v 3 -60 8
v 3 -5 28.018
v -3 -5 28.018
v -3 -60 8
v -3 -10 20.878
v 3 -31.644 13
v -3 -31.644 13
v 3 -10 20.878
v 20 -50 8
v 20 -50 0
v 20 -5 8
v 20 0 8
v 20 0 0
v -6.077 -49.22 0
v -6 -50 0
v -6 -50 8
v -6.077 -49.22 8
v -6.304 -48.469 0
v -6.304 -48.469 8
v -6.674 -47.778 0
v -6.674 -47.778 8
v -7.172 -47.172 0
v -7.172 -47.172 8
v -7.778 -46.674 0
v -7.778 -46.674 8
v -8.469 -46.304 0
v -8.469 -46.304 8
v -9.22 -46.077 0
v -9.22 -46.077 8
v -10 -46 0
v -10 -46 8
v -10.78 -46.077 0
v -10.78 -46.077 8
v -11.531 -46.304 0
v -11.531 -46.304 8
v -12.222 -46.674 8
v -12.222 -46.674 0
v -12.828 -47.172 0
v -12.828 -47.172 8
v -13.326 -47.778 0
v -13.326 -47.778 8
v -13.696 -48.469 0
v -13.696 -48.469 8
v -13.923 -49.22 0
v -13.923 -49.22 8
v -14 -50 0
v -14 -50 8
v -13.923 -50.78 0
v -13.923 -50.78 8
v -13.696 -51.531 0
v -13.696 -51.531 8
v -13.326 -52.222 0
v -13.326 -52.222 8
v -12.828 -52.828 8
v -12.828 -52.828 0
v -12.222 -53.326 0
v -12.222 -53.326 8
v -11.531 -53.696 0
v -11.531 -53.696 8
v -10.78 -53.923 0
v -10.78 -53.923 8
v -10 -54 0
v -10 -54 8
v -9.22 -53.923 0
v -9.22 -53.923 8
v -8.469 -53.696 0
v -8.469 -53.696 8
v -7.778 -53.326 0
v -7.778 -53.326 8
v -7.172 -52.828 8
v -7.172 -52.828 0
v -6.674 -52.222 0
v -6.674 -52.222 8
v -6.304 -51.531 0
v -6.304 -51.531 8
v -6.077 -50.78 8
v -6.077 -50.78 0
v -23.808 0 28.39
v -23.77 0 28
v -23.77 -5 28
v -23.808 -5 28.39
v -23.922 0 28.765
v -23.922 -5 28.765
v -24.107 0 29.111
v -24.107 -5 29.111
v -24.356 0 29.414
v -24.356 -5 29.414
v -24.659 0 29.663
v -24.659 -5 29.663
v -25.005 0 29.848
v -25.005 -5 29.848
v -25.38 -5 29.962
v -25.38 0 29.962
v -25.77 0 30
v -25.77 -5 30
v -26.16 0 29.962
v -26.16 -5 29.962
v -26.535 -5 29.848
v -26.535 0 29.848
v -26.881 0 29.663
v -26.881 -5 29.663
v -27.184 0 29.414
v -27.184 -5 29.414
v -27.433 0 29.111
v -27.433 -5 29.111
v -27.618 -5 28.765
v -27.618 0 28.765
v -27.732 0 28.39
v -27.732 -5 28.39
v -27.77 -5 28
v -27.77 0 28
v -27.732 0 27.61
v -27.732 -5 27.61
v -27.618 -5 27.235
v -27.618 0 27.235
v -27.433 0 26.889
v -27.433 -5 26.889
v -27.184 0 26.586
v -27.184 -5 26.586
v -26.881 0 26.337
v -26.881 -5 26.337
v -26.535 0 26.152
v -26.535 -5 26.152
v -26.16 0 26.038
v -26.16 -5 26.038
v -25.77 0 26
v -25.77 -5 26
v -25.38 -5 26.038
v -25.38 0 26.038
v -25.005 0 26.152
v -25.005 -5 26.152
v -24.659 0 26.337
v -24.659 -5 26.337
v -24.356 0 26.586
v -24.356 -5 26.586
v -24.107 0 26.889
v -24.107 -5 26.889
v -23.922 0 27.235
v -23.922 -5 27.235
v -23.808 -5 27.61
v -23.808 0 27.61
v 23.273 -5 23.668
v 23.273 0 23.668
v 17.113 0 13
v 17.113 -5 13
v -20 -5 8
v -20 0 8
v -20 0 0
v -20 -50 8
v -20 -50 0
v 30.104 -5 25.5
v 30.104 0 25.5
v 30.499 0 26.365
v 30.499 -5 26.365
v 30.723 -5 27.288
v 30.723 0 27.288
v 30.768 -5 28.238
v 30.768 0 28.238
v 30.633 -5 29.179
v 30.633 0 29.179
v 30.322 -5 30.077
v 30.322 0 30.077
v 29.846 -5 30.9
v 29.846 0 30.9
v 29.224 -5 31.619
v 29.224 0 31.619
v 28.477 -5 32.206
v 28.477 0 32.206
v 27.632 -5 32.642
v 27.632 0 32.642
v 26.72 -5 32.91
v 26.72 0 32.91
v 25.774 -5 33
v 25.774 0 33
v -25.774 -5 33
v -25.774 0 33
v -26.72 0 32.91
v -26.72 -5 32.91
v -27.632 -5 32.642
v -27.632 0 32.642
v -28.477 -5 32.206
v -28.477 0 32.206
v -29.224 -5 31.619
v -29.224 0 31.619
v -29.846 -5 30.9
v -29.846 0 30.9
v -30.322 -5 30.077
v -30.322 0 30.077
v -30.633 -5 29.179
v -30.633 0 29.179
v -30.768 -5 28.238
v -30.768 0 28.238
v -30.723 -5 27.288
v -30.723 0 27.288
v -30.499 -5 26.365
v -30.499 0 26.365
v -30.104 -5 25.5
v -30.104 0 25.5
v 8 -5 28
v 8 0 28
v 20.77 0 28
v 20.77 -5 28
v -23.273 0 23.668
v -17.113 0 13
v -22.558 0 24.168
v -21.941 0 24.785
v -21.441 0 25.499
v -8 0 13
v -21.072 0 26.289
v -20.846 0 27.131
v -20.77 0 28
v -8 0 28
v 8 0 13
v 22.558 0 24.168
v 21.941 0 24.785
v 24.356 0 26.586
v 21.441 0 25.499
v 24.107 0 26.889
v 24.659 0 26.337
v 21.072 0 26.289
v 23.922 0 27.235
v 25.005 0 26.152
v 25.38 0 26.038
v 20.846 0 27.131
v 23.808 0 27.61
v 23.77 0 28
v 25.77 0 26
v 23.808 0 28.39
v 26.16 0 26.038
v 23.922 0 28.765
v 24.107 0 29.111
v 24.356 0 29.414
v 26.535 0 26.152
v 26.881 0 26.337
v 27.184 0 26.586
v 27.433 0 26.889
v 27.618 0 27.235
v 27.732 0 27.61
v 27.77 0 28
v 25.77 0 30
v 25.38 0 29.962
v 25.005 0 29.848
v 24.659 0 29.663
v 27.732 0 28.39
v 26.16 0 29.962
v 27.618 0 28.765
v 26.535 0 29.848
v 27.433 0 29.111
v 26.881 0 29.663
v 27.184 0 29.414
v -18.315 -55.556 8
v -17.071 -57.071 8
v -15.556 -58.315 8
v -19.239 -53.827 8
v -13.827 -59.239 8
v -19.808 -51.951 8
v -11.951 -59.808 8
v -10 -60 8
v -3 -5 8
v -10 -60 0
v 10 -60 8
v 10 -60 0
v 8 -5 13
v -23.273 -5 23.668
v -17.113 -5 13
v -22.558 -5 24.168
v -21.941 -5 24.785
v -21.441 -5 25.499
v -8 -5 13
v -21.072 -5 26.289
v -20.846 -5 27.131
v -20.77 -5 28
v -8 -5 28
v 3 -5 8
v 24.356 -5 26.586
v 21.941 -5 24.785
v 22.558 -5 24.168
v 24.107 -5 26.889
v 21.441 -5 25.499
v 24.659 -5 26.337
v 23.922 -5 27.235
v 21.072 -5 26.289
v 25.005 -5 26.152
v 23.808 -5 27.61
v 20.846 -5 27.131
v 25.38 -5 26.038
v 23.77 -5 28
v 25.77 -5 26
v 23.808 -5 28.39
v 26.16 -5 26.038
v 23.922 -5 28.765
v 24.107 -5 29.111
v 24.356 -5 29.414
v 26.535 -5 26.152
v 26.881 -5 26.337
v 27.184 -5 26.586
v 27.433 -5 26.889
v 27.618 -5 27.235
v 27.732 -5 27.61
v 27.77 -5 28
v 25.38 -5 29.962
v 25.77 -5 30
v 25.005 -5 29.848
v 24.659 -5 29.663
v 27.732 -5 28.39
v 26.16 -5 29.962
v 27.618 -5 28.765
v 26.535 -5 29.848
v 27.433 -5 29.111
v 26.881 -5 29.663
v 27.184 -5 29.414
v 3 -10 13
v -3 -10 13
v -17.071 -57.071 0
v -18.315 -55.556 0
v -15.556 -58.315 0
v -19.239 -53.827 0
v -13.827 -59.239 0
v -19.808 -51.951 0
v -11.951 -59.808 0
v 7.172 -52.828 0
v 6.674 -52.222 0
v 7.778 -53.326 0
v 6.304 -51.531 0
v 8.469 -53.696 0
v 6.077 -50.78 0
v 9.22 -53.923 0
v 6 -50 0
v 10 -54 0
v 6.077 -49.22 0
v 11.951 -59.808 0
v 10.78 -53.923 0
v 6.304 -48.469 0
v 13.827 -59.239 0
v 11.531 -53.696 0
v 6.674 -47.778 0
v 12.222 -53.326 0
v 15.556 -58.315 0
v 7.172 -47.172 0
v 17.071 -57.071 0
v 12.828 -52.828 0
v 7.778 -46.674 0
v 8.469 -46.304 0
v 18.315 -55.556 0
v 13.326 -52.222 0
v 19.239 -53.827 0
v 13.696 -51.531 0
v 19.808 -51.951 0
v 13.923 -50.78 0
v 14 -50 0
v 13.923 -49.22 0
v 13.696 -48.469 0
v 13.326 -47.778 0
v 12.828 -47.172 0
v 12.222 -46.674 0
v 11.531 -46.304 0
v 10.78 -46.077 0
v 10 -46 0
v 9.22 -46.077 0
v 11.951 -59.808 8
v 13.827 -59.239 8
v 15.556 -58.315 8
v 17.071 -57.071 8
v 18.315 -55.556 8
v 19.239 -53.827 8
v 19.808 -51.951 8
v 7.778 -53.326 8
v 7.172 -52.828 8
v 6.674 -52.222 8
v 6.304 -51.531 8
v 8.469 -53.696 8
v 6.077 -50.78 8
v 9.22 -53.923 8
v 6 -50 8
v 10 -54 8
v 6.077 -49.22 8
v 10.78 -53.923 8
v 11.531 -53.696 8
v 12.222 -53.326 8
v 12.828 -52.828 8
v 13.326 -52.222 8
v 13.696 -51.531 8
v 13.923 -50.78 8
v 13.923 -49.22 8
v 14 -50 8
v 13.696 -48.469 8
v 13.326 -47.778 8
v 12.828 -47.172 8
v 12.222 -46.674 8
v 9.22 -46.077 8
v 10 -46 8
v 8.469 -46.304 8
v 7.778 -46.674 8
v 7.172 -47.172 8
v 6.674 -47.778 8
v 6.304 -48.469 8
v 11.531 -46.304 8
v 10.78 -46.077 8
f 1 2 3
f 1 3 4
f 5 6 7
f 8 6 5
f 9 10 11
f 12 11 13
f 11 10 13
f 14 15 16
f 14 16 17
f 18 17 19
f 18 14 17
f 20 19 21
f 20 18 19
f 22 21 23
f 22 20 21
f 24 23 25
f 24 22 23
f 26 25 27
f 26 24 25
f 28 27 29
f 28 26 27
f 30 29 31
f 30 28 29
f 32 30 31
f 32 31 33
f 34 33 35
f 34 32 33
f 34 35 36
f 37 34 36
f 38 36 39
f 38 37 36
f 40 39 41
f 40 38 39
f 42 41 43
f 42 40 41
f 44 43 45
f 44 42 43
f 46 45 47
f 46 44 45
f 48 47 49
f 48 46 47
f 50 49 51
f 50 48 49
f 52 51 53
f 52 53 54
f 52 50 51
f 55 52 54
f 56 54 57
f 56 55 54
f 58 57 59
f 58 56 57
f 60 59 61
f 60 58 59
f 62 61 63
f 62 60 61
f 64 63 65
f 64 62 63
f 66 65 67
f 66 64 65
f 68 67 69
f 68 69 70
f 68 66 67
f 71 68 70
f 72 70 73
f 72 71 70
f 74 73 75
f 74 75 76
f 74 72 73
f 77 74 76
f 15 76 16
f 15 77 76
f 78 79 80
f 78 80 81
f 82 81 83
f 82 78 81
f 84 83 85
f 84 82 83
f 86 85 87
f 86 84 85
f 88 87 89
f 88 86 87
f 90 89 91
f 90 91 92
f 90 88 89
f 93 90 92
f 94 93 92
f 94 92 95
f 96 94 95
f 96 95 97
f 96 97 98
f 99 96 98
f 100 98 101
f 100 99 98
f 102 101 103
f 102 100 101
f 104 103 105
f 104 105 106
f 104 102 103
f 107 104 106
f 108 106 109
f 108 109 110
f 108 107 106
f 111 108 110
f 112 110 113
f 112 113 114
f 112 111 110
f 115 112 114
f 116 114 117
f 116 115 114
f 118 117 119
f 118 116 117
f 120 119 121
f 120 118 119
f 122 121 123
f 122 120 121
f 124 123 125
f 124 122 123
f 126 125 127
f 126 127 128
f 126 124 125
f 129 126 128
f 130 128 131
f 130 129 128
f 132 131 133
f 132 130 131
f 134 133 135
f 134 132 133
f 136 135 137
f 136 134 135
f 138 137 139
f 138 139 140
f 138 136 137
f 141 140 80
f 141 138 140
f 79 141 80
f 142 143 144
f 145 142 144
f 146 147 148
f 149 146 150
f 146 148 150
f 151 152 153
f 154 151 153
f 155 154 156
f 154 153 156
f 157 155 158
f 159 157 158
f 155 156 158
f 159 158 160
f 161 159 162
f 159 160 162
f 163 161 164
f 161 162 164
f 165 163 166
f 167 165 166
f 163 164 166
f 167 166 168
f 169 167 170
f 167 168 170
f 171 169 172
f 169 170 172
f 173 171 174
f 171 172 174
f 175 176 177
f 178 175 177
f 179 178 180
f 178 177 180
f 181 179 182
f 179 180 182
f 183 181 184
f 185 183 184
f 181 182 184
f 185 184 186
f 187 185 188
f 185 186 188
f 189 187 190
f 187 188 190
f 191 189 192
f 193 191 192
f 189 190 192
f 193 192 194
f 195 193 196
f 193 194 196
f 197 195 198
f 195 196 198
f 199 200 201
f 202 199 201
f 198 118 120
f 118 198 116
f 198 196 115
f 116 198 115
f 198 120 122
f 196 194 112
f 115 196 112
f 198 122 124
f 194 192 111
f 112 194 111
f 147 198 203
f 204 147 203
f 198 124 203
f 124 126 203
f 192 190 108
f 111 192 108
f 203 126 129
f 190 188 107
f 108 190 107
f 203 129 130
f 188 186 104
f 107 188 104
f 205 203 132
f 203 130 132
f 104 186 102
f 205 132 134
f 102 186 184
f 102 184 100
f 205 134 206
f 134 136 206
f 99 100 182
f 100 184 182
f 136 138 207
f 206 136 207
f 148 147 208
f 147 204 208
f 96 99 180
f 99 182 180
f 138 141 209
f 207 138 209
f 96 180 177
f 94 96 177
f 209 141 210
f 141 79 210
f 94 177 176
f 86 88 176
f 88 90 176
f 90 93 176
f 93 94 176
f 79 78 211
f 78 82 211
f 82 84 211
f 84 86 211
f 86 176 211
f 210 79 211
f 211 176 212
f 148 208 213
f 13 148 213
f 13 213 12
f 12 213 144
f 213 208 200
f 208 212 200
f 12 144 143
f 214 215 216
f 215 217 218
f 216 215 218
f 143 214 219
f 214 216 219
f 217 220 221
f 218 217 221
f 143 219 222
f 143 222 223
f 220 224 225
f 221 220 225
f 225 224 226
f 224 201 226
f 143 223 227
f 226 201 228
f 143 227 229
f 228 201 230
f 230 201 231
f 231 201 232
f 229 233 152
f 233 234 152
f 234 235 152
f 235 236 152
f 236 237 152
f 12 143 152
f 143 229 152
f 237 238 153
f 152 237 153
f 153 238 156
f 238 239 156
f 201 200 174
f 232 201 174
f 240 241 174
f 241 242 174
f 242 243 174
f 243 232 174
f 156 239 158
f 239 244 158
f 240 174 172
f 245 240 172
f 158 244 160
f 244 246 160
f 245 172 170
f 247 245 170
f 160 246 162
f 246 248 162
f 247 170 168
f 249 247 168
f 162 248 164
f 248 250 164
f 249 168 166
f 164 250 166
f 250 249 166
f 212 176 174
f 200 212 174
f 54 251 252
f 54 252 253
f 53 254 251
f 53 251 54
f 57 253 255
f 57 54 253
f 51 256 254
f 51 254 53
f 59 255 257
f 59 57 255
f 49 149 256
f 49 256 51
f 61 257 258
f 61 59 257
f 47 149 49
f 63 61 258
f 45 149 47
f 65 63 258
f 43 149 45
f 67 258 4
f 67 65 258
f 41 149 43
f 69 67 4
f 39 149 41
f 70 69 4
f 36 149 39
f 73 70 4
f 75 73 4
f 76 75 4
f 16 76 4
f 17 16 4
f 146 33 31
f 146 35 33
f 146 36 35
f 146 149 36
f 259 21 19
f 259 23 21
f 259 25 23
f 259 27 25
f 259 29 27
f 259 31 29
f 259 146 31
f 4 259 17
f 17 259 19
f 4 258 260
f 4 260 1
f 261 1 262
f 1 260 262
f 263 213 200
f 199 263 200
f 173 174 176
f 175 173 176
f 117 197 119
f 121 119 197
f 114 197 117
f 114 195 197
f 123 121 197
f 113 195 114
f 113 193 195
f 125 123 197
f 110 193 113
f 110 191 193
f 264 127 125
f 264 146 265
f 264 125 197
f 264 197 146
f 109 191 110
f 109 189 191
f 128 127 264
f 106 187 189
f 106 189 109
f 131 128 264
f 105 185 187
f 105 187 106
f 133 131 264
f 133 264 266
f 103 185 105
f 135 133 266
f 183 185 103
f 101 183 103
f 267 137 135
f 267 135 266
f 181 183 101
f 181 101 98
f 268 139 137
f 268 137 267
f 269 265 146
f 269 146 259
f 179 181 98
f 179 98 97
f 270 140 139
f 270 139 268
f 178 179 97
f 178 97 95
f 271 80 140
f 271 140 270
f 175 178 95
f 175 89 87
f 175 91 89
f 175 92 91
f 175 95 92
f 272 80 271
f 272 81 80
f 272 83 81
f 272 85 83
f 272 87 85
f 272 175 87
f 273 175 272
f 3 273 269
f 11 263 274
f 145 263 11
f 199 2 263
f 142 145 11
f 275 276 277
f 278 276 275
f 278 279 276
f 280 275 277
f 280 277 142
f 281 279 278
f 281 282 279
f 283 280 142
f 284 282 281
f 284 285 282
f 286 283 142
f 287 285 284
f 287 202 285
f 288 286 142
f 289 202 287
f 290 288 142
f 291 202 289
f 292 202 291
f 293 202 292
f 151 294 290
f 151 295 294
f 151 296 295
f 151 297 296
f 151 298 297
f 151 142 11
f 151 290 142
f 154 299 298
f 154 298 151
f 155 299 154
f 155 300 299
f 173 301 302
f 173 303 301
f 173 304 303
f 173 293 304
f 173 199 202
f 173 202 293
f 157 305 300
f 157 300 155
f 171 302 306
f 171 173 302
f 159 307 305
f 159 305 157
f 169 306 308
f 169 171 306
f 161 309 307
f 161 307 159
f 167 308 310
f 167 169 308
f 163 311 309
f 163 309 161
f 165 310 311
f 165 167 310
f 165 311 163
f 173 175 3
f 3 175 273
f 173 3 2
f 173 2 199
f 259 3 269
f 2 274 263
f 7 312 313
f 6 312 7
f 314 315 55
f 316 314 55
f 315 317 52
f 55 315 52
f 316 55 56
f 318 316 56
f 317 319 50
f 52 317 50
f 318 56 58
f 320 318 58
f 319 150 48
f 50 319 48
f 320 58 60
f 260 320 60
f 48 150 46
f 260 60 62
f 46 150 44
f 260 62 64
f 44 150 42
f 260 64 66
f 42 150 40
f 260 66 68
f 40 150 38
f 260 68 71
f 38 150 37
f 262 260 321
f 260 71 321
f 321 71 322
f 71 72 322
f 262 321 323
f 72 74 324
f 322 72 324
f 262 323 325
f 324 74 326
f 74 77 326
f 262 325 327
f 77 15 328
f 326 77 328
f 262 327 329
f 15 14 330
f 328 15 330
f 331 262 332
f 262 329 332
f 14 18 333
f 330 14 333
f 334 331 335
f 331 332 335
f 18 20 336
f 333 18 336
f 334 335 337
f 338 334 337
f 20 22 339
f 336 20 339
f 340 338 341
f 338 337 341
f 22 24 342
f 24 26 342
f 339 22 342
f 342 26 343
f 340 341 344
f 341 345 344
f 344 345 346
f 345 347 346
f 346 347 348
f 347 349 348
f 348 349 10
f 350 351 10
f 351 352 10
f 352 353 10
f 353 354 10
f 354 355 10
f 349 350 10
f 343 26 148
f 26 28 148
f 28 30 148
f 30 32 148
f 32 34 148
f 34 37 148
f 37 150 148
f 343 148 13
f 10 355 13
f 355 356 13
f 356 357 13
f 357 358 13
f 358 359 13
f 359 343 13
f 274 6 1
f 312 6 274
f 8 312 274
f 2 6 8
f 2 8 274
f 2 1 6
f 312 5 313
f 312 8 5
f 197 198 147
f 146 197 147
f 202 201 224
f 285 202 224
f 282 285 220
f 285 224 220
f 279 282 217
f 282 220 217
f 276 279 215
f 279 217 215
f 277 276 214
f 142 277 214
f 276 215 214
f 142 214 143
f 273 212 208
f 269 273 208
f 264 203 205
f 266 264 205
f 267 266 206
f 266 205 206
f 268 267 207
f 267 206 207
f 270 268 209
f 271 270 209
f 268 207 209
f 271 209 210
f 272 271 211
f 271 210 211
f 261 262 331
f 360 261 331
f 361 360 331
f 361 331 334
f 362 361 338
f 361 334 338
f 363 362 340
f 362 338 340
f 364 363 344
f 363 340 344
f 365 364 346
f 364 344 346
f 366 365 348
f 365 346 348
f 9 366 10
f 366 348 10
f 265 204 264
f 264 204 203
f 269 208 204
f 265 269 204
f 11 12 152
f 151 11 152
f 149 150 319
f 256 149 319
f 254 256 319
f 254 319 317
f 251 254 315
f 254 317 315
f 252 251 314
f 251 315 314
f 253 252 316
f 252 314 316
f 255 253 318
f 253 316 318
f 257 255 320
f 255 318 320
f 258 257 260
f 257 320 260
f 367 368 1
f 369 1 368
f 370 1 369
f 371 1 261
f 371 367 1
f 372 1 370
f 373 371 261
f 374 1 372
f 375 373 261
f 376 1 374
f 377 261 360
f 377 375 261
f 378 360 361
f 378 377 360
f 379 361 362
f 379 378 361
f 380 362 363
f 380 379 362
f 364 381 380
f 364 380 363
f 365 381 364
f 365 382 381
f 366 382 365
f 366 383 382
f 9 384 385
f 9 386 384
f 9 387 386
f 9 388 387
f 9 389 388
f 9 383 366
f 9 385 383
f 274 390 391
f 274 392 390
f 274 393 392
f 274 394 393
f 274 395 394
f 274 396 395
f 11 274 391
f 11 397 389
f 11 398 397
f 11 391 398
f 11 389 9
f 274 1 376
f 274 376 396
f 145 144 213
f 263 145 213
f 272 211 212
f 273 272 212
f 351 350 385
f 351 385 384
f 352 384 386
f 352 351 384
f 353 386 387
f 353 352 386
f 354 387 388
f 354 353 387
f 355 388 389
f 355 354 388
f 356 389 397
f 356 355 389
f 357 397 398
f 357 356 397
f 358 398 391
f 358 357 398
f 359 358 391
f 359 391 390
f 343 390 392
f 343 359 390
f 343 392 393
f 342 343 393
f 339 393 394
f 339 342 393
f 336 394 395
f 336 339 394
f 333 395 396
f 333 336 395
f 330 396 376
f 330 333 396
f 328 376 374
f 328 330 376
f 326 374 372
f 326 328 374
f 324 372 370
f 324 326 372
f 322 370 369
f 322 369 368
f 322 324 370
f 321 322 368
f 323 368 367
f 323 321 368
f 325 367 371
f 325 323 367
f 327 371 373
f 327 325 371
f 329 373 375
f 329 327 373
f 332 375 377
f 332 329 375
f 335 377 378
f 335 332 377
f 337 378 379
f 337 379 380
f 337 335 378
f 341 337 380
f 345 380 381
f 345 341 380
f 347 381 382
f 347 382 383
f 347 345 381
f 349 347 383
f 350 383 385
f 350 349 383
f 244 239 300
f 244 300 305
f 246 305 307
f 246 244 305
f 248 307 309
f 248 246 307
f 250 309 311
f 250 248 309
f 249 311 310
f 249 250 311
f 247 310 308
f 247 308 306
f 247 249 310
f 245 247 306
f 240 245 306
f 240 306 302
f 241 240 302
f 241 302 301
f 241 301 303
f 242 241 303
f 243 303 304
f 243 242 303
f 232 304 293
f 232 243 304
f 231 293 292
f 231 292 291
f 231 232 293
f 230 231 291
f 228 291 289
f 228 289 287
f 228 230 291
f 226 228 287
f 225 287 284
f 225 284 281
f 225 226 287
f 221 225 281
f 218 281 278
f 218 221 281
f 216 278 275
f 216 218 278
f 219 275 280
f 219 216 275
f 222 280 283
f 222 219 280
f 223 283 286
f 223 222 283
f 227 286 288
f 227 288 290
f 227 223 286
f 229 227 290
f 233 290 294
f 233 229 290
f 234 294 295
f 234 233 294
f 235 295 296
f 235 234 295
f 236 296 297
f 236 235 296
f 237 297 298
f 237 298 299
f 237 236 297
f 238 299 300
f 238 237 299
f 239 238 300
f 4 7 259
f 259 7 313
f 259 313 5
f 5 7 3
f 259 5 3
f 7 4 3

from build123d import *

# Parameters (mm, degrees)
F0_R     = 4
F1_DEPTH = 8
F2_R     = 2
F3_DEPTH = 5
F5_DEPTH = 3


with BuildPart() as f1:
    # F0 (on Top) → F1 (new body)
    with BuildSketch(Plane.XY):
        with BuildLine():
            Line((20, 0), (0, 0))
            Line((0, 0), (0, -60))
            Line((0, -60), (10, -60))
            ThreePointArc((10, -60), (17.0710678119, -57.0710678119), (20, -50))
            Line((20, -50), (20, 0))
        make_face()
        with Locations((10, -50)):
            Circle(F0_R, mode=Mode.SUBTRACT)
        with BuildLine():
            Line((0, -60), (0, 0))
            Line((0, 0), (-20, 0))
            Line((-20, 0), (-20, -50))
            ThreePointArc((-20, -50), (-17.0710678119, -57.0710678119), (-10, -60))
            Line((-10, -60), (0, -60))
        make_face()
        with Locations((-10, -50)):
            Circle(F0_R, mode=Mode.SUBTRACT)
    extrude(amount=F1_DEPTH)

    # F2 (on Front) → F3 (join)
    with BuildSketch(Plane.XZ):
        Polygon((-3, 8), (3, 8), (3, 28), (0, 28), (-3, 28), align=None)
        with BuildLine():
            Line((3, 8), (20, 8))
            Line((20, 8), (30.1036297108, 25.5))
            ThreePointArc((30.1036297108, 25.5), (30.1036297108, 30.5), (25.7735026919, 33))
            Line((25.7735026919, 33), (0, 33))
            Line((0, 33), (-25.7735026919, 33))
            ThreePointArc((-25.7735026919, 33), (-30.1036297108, 30.5), (-30.1036297108, 25.5))
            Line((-30.1036297108, 25.5), (-20, 8))
            Line((-20, 8), (-3, 8))
            Line((-3, 8), (-3, 28))
            Line((-3, 28), (0, 28))
            Line((0, 28), (3, 28))
            Line((3, 28), (3, 8))
        make_face()
        with BuildLine():
            Line((-20.77, 28), (-8, 28))
            Line((-8, 28), (-8, 13))
            Line((-8, 13), (-17.1132486541, 13))
            Line((-17.1132486541, 13), (-23.272627479, 23.6683570679))
            ThreePointArc((-23.272627479, 23.6683570679), (-21.4406315354, 25.4986866055), (-20.77, 28))
        make_face(mode=Mode.SUBTRACT)
        with Locations((-25.77, 28)):
            Circle(F2_R, mode=Mode.SUBTRACT)
        with BuildLine():
            Line((8, 13), (8, 28))
            Line((8, 28), (20.77, 28))
            ThreePointArc((20.77, 28), (21.4406315354, 25.4986866055), (23.272627479, 23.6683570679))
            Line((23.272627479, 23.6683570679), (17.1132486541, 13))
            Line((17.1132486541, 13), (8, 13))
        make_face(mode=Mode.SUBTRACT)
        with Locations((25.77, 28)):
            Circle(F2_R, mode=Mode.SUBTRACT)
    extrude(amount=F3_DEPTH)

    # F4 (on Right) → F5 (join, symmetric)
    with BuildSketch(Plane.YZ):
        Polygon((-50, 8), (-5, 8), (-5, 25.5), (-5, 28.0183628846), (-60, 8), align=None)
        Polygon((-31.6435909019, 13), (-10, 20.8776228509), (-10, 13), align=None, mode=Mode.SUBTRACT)
    extrude(amount=F5_DEPTH, both=True)


solid = f1.part
